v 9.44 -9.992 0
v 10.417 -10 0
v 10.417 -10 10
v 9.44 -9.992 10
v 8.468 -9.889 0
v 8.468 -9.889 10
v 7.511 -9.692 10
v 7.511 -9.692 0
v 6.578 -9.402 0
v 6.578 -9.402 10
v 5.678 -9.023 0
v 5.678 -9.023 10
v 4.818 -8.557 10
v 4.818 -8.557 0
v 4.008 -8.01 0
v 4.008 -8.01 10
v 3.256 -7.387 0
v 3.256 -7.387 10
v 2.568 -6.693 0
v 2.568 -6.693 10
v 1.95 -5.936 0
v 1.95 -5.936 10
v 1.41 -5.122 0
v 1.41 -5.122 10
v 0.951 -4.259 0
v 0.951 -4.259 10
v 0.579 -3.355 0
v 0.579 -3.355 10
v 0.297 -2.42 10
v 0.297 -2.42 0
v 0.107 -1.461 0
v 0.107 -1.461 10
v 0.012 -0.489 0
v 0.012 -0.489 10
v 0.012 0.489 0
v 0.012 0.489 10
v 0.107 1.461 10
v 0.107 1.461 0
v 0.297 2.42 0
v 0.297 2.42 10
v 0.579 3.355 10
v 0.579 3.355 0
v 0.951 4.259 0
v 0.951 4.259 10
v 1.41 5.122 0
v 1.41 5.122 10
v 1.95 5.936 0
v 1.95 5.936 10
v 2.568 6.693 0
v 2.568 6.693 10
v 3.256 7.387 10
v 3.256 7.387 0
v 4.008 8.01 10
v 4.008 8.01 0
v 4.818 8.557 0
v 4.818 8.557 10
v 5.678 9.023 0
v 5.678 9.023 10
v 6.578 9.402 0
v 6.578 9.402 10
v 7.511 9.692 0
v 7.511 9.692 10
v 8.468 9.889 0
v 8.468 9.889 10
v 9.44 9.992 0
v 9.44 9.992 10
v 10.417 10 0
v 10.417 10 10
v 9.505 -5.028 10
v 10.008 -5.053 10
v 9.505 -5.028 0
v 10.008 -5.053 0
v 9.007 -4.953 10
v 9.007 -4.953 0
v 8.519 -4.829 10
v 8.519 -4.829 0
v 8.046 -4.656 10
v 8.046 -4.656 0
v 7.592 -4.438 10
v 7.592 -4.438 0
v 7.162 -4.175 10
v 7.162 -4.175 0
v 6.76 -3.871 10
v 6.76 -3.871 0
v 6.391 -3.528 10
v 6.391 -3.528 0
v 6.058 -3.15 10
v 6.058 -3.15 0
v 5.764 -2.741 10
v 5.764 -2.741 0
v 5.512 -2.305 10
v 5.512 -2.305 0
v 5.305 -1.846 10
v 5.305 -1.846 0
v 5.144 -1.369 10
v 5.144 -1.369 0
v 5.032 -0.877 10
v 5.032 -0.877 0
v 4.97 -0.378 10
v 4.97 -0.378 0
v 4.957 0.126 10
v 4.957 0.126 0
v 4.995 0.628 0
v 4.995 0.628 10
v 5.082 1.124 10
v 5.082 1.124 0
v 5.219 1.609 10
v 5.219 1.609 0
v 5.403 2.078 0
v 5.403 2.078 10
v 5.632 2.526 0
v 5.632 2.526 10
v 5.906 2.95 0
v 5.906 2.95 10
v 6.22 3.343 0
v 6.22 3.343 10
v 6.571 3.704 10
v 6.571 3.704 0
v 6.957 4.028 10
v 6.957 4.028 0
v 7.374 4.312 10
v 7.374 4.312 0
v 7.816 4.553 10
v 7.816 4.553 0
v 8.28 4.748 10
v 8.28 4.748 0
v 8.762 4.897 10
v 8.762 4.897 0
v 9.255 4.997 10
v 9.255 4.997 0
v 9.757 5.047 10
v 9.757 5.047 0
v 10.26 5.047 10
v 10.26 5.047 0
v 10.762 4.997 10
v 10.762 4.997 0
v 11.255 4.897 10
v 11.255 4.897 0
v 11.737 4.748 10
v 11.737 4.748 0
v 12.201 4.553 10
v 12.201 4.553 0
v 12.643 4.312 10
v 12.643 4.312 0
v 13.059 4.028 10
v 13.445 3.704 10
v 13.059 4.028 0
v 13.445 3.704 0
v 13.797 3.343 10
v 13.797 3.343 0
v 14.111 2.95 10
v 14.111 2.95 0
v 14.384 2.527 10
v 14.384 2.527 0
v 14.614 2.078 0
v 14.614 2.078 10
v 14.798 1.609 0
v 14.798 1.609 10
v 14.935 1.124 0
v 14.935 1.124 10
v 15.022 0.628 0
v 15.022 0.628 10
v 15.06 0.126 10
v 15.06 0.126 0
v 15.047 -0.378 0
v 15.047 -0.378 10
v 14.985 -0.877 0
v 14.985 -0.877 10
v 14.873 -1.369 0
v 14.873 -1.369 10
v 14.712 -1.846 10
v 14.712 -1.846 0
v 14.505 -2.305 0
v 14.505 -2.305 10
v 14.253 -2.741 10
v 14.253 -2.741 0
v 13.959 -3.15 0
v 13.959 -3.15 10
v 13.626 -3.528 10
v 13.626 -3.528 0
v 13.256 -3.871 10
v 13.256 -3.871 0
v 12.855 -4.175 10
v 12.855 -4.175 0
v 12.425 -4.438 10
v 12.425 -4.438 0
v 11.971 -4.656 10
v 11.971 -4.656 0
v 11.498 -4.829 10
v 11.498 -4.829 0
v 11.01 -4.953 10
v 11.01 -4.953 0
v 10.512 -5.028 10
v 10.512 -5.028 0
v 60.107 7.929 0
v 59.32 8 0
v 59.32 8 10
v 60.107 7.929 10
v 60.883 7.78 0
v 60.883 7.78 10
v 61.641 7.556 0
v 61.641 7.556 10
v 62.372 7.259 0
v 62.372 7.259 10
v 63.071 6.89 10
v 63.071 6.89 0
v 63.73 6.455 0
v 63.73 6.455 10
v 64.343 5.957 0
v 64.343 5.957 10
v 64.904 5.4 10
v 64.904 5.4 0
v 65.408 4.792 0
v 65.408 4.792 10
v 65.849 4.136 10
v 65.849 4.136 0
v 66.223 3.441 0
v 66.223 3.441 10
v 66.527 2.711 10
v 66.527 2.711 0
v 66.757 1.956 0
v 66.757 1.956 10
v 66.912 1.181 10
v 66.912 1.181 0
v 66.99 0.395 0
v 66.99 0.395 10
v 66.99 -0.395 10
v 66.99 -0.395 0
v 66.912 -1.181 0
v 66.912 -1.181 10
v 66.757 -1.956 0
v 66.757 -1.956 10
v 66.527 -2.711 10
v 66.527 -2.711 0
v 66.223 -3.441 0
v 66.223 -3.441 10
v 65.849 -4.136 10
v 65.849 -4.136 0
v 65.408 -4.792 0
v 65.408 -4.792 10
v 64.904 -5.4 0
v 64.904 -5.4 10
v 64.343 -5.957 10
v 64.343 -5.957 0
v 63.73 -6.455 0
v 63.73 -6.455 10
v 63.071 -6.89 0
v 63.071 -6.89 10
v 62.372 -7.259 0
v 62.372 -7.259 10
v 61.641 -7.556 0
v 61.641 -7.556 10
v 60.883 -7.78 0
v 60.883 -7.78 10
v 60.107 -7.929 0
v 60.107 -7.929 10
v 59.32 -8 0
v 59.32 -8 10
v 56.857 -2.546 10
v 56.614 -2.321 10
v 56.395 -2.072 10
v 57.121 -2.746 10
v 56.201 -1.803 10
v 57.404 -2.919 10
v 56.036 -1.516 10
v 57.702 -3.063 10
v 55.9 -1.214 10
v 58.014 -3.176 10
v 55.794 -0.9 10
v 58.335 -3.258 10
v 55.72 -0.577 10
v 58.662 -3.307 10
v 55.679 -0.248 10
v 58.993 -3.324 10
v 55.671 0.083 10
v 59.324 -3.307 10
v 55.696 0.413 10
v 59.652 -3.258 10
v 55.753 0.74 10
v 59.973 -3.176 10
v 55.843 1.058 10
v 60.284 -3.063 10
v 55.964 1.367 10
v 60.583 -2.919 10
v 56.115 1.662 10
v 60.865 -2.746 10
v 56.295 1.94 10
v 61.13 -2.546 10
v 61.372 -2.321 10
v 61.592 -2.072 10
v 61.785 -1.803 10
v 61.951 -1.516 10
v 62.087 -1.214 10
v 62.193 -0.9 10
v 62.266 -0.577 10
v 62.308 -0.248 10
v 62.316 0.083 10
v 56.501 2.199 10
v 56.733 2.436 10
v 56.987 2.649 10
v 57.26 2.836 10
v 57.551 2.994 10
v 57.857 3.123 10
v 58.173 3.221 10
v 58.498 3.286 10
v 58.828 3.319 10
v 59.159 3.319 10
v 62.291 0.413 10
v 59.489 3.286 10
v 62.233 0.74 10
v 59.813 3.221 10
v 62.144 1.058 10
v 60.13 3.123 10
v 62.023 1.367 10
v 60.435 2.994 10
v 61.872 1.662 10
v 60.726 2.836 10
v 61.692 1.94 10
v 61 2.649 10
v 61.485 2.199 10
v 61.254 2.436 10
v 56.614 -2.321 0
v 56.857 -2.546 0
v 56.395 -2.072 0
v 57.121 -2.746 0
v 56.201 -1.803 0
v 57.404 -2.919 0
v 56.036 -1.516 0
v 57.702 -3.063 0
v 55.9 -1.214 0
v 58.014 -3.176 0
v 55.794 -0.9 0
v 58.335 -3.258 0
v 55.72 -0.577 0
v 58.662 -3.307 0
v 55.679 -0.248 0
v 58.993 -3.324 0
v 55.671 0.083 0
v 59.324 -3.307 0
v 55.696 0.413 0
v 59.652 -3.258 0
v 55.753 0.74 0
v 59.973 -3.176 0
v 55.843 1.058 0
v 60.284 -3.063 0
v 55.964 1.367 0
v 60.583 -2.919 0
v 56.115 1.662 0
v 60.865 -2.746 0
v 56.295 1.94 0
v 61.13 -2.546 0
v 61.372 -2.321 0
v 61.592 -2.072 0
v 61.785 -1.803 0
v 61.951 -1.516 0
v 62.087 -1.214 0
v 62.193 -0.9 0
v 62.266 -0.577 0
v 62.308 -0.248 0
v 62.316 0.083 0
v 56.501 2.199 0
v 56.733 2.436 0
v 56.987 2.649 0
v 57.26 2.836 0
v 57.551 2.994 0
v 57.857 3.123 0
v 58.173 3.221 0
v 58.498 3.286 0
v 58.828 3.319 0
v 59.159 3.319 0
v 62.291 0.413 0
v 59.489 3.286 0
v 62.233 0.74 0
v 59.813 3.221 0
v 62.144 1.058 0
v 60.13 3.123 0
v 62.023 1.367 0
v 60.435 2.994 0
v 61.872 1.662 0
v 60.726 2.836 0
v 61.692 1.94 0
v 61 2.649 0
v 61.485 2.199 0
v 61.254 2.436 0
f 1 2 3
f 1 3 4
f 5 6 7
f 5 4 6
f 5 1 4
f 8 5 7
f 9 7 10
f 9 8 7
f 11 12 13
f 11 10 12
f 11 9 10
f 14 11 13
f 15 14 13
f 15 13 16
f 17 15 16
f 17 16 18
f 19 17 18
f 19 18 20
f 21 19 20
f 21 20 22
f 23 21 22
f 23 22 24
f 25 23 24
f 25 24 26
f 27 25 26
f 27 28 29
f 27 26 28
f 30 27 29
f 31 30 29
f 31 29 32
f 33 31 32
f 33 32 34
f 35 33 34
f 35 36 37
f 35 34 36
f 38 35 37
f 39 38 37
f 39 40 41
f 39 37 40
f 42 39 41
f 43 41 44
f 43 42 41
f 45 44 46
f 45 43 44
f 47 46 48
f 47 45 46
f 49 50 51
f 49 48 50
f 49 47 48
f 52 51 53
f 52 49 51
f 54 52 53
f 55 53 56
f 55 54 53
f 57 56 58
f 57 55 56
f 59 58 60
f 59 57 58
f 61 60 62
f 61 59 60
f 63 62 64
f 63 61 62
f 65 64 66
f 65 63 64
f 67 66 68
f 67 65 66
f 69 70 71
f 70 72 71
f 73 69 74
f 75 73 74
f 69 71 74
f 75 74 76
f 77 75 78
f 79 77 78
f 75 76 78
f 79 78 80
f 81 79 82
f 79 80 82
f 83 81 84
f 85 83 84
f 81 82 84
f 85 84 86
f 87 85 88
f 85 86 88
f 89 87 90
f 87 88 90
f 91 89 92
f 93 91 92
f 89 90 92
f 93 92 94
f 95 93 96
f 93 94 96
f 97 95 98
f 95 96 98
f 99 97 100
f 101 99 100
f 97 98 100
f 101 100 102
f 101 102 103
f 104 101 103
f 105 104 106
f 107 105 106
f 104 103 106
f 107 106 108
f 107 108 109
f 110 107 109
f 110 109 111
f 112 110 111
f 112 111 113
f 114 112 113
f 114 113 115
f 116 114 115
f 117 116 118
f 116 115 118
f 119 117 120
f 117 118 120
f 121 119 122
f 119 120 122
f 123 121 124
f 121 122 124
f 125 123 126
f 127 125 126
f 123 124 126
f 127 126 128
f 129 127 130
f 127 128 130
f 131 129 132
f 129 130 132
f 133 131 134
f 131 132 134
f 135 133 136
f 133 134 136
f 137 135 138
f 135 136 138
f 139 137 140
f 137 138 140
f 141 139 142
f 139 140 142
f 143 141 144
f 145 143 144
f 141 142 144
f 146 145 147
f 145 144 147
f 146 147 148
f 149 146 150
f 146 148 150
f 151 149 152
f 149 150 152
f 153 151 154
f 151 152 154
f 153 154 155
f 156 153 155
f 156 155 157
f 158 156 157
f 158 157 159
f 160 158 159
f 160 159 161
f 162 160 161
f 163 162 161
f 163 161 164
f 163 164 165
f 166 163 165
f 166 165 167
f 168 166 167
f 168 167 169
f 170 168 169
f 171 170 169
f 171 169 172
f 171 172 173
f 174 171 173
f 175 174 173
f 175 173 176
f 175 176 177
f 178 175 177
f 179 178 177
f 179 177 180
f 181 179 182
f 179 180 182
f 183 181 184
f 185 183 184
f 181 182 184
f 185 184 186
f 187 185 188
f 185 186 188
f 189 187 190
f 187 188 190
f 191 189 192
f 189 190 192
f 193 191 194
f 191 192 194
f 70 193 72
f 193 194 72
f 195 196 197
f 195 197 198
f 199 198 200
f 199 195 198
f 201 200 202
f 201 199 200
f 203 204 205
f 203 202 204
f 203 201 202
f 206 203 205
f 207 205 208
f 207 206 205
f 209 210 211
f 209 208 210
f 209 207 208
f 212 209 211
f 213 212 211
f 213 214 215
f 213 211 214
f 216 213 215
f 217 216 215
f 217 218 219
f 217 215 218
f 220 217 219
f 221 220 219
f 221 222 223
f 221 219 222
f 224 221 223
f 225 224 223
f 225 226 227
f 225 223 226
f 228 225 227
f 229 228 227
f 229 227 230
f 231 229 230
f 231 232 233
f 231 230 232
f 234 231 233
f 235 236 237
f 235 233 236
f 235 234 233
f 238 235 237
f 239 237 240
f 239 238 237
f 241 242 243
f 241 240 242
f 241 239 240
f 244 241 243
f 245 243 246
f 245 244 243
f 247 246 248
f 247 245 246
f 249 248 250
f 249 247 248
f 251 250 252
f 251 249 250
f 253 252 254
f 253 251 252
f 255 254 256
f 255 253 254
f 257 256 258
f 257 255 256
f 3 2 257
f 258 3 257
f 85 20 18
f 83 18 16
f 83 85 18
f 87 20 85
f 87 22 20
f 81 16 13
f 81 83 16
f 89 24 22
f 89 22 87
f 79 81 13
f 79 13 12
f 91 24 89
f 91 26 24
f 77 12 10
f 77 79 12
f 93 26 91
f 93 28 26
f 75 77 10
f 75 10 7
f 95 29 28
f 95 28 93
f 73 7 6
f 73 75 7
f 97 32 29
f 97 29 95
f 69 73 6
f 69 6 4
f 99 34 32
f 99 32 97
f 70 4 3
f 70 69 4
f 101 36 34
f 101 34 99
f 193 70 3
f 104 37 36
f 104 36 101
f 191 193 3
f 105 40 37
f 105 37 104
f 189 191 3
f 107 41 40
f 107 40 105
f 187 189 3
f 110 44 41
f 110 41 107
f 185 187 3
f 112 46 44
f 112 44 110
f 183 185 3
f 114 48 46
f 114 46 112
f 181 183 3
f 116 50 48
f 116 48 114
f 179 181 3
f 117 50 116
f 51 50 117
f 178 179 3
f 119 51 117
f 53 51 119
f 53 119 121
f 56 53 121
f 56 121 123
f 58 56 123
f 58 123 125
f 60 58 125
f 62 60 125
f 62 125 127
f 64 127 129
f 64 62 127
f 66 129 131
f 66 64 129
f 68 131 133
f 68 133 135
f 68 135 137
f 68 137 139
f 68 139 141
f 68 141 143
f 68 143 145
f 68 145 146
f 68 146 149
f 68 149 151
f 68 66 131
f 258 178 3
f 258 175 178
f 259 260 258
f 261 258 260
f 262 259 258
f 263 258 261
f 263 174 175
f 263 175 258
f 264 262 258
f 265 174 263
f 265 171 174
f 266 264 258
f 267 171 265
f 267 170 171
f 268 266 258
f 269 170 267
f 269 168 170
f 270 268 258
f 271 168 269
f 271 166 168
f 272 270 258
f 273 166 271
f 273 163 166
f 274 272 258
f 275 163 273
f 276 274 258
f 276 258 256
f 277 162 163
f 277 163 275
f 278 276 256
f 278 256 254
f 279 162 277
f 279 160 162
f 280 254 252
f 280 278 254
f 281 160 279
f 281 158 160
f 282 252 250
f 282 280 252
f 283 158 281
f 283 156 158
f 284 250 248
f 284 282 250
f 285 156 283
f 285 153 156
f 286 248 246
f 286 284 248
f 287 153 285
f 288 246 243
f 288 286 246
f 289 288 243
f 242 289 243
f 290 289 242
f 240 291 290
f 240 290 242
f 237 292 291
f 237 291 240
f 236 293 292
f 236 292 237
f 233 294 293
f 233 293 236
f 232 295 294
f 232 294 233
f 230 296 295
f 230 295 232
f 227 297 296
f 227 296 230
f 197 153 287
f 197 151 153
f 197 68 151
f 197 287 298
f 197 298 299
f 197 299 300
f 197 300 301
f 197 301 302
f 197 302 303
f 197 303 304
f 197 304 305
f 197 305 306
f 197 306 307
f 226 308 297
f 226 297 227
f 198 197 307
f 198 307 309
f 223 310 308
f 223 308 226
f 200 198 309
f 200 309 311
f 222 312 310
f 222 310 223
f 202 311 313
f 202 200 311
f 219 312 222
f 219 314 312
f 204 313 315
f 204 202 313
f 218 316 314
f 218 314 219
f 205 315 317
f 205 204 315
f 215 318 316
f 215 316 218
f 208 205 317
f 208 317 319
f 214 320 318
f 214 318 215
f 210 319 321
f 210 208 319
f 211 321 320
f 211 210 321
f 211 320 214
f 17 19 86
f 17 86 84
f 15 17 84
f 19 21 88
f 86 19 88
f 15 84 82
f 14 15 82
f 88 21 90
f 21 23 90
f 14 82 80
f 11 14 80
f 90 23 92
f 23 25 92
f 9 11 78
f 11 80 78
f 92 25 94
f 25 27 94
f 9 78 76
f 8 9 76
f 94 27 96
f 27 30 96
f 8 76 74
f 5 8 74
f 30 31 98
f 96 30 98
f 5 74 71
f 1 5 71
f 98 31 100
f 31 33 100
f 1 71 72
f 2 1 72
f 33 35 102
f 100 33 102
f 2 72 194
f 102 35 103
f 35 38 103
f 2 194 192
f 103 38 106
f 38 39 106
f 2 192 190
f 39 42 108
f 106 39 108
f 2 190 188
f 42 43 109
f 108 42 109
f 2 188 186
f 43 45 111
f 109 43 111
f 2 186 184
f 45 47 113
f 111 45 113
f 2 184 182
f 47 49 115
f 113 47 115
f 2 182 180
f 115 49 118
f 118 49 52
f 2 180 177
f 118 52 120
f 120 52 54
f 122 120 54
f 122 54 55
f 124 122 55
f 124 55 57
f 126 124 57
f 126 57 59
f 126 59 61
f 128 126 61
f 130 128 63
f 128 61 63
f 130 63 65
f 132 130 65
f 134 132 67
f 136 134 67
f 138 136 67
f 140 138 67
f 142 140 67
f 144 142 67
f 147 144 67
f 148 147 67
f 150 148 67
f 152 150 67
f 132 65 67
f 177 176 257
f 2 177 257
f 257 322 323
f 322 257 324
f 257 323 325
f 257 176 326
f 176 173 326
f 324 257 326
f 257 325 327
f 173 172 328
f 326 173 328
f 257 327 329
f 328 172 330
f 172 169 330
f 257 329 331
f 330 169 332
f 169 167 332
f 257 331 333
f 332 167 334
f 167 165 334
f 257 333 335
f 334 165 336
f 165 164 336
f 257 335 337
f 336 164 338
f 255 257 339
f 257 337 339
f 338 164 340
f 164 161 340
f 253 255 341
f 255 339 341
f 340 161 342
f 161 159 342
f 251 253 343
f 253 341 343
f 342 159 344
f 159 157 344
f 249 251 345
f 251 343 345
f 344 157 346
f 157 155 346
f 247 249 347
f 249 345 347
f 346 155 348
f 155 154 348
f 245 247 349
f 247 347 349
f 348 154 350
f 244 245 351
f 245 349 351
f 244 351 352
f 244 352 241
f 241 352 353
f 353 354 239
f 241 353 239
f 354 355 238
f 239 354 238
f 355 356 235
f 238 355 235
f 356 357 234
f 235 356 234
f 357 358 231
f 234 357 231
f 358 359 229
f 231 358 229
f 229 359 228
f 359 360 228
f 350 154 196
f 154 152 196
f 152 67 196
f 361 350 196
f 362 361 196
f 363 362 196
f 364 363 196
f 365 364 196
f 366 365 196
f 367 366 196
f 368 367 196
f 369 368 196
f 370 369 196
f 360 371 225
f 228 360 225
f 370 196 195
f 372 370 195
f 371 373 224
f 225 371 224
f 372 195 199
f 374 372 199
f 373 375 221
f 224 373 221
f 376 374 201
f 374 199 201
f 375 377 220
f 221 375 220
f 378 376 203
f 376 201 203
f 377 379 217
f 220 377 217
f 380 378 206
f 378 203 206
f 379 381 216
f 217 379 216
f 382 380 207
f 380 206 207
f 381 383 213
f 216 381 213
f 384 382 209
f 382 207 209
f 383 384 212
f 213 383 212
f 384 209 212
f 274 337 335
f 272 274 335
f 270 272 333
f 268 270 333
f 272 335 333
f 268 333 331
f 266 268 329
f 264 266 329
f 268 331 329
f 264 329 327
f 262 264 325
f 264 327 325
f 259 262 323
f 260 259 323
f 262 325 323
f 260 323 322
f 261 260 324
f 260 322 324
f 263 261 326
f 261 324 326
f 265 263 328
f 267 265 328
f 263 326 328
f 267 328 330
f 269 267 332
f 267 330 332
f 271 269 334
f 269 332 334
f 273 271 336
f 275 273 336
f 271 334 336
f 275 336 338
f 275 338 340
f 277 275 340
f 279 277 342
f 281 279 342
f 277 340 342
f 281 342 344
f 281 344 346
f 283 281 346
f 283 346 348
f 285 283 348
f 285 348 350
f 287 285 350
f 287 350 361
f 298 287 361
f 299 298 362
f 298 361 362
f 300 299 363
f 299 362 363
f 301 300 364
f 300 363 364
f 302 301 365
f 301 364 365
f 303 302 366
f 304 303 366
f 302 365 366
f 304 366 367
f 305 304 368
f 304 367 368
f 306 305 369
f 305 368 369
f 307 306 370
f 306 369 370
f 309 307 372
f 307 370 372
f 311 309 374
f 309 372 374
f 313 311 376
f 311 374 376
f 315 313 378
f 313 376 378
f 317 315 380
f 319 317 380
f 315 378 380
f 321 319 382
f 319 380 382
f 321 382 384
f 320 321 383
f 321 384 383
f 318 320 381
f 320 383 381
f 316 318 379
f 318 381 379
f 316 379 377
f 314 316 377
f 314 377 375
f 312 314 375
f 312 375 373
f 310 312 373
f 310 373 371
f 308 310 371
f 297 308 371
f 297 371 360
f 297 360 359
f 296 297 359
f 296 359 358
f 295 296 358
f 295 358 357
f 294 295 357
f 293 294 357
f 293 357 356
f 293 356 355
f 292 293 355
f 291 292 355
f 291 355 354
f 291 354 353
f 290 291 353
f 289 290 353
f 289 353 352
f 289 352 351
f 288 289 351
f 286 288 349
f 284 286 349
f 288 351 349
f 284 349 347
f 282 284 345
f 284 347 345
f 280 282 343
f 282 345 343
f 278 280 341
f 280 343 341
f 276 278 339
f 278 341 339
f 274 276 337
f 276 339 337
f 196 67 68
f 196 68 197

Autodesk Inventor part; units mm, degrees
ref_plane "YZ Plane" through (0, 0, 0) normal (1, 0, 0) x (0, 1, 0)
ref_plane "XZ Plane" through (0, 0, 0) normal (0, 1, 0) x (-1, 0, 0)
ref_plane "XY Plane" through (0, 0, 0) normal (0, 0, 1) x (1, 0, 0)
sketch "Skizze1" plane through (0, 0, 0) normal (0, 0, 1) x (1, 0, 0)
  arc A0 (10.4173, 10) -> (10.4173, -10) centre (10.0084, 0) ccw
  line L0 (10.4173, 10) -> (59.3205, 8)
  line L1 (10.4173, -10) -> (59.3205, -8)
  arc A1 (59.3205, -8) -> (59.3205, 8) centre (58.9933, 0) ccw
  point P0 (0, 0)
  point P1 (67, 0)
  point P2 (0, 0)
  dimension "d0" = 20
  dimension "d1" = 16
  dimension "d2" = 67
extrude "Extrusion1" add sketch "Skizze1" along normal blind 10
sketch "Skizze2" plane through (0, 0, 10) normal (0, 0, 1) x (1, 0, 0)
  arc A0 (10.4173, 10) -> (10.4173, -10) centre (10.0084, 0) ccw projected
  point P0 (0, 0)
hole "Bohrung1" at (10.0084, 0, 10) direction (0, 0, -1) diameter 10.106 end through all thread size "M12x1.75" class "6H" standard "ISO Metric profile"
sketch "Skizze3" plane through (0, 0, 10) normal (0, 0, 1) x (1, 0, 0)
  arc A0 (59.3205, -8) -> (59.3205, 8) centre (58.9933, 0) ccw projected
  point P0 (0, 0)
hole "Bohrung2" at (58.9933, 0, 10) direction (0, 0, -1) diameter 6.647 end through all thread size "M8x1.25" class "6H" standard "ISO Metric profile"
properties part number "Kurbelarm" material "Stahl, galvanisiert"
